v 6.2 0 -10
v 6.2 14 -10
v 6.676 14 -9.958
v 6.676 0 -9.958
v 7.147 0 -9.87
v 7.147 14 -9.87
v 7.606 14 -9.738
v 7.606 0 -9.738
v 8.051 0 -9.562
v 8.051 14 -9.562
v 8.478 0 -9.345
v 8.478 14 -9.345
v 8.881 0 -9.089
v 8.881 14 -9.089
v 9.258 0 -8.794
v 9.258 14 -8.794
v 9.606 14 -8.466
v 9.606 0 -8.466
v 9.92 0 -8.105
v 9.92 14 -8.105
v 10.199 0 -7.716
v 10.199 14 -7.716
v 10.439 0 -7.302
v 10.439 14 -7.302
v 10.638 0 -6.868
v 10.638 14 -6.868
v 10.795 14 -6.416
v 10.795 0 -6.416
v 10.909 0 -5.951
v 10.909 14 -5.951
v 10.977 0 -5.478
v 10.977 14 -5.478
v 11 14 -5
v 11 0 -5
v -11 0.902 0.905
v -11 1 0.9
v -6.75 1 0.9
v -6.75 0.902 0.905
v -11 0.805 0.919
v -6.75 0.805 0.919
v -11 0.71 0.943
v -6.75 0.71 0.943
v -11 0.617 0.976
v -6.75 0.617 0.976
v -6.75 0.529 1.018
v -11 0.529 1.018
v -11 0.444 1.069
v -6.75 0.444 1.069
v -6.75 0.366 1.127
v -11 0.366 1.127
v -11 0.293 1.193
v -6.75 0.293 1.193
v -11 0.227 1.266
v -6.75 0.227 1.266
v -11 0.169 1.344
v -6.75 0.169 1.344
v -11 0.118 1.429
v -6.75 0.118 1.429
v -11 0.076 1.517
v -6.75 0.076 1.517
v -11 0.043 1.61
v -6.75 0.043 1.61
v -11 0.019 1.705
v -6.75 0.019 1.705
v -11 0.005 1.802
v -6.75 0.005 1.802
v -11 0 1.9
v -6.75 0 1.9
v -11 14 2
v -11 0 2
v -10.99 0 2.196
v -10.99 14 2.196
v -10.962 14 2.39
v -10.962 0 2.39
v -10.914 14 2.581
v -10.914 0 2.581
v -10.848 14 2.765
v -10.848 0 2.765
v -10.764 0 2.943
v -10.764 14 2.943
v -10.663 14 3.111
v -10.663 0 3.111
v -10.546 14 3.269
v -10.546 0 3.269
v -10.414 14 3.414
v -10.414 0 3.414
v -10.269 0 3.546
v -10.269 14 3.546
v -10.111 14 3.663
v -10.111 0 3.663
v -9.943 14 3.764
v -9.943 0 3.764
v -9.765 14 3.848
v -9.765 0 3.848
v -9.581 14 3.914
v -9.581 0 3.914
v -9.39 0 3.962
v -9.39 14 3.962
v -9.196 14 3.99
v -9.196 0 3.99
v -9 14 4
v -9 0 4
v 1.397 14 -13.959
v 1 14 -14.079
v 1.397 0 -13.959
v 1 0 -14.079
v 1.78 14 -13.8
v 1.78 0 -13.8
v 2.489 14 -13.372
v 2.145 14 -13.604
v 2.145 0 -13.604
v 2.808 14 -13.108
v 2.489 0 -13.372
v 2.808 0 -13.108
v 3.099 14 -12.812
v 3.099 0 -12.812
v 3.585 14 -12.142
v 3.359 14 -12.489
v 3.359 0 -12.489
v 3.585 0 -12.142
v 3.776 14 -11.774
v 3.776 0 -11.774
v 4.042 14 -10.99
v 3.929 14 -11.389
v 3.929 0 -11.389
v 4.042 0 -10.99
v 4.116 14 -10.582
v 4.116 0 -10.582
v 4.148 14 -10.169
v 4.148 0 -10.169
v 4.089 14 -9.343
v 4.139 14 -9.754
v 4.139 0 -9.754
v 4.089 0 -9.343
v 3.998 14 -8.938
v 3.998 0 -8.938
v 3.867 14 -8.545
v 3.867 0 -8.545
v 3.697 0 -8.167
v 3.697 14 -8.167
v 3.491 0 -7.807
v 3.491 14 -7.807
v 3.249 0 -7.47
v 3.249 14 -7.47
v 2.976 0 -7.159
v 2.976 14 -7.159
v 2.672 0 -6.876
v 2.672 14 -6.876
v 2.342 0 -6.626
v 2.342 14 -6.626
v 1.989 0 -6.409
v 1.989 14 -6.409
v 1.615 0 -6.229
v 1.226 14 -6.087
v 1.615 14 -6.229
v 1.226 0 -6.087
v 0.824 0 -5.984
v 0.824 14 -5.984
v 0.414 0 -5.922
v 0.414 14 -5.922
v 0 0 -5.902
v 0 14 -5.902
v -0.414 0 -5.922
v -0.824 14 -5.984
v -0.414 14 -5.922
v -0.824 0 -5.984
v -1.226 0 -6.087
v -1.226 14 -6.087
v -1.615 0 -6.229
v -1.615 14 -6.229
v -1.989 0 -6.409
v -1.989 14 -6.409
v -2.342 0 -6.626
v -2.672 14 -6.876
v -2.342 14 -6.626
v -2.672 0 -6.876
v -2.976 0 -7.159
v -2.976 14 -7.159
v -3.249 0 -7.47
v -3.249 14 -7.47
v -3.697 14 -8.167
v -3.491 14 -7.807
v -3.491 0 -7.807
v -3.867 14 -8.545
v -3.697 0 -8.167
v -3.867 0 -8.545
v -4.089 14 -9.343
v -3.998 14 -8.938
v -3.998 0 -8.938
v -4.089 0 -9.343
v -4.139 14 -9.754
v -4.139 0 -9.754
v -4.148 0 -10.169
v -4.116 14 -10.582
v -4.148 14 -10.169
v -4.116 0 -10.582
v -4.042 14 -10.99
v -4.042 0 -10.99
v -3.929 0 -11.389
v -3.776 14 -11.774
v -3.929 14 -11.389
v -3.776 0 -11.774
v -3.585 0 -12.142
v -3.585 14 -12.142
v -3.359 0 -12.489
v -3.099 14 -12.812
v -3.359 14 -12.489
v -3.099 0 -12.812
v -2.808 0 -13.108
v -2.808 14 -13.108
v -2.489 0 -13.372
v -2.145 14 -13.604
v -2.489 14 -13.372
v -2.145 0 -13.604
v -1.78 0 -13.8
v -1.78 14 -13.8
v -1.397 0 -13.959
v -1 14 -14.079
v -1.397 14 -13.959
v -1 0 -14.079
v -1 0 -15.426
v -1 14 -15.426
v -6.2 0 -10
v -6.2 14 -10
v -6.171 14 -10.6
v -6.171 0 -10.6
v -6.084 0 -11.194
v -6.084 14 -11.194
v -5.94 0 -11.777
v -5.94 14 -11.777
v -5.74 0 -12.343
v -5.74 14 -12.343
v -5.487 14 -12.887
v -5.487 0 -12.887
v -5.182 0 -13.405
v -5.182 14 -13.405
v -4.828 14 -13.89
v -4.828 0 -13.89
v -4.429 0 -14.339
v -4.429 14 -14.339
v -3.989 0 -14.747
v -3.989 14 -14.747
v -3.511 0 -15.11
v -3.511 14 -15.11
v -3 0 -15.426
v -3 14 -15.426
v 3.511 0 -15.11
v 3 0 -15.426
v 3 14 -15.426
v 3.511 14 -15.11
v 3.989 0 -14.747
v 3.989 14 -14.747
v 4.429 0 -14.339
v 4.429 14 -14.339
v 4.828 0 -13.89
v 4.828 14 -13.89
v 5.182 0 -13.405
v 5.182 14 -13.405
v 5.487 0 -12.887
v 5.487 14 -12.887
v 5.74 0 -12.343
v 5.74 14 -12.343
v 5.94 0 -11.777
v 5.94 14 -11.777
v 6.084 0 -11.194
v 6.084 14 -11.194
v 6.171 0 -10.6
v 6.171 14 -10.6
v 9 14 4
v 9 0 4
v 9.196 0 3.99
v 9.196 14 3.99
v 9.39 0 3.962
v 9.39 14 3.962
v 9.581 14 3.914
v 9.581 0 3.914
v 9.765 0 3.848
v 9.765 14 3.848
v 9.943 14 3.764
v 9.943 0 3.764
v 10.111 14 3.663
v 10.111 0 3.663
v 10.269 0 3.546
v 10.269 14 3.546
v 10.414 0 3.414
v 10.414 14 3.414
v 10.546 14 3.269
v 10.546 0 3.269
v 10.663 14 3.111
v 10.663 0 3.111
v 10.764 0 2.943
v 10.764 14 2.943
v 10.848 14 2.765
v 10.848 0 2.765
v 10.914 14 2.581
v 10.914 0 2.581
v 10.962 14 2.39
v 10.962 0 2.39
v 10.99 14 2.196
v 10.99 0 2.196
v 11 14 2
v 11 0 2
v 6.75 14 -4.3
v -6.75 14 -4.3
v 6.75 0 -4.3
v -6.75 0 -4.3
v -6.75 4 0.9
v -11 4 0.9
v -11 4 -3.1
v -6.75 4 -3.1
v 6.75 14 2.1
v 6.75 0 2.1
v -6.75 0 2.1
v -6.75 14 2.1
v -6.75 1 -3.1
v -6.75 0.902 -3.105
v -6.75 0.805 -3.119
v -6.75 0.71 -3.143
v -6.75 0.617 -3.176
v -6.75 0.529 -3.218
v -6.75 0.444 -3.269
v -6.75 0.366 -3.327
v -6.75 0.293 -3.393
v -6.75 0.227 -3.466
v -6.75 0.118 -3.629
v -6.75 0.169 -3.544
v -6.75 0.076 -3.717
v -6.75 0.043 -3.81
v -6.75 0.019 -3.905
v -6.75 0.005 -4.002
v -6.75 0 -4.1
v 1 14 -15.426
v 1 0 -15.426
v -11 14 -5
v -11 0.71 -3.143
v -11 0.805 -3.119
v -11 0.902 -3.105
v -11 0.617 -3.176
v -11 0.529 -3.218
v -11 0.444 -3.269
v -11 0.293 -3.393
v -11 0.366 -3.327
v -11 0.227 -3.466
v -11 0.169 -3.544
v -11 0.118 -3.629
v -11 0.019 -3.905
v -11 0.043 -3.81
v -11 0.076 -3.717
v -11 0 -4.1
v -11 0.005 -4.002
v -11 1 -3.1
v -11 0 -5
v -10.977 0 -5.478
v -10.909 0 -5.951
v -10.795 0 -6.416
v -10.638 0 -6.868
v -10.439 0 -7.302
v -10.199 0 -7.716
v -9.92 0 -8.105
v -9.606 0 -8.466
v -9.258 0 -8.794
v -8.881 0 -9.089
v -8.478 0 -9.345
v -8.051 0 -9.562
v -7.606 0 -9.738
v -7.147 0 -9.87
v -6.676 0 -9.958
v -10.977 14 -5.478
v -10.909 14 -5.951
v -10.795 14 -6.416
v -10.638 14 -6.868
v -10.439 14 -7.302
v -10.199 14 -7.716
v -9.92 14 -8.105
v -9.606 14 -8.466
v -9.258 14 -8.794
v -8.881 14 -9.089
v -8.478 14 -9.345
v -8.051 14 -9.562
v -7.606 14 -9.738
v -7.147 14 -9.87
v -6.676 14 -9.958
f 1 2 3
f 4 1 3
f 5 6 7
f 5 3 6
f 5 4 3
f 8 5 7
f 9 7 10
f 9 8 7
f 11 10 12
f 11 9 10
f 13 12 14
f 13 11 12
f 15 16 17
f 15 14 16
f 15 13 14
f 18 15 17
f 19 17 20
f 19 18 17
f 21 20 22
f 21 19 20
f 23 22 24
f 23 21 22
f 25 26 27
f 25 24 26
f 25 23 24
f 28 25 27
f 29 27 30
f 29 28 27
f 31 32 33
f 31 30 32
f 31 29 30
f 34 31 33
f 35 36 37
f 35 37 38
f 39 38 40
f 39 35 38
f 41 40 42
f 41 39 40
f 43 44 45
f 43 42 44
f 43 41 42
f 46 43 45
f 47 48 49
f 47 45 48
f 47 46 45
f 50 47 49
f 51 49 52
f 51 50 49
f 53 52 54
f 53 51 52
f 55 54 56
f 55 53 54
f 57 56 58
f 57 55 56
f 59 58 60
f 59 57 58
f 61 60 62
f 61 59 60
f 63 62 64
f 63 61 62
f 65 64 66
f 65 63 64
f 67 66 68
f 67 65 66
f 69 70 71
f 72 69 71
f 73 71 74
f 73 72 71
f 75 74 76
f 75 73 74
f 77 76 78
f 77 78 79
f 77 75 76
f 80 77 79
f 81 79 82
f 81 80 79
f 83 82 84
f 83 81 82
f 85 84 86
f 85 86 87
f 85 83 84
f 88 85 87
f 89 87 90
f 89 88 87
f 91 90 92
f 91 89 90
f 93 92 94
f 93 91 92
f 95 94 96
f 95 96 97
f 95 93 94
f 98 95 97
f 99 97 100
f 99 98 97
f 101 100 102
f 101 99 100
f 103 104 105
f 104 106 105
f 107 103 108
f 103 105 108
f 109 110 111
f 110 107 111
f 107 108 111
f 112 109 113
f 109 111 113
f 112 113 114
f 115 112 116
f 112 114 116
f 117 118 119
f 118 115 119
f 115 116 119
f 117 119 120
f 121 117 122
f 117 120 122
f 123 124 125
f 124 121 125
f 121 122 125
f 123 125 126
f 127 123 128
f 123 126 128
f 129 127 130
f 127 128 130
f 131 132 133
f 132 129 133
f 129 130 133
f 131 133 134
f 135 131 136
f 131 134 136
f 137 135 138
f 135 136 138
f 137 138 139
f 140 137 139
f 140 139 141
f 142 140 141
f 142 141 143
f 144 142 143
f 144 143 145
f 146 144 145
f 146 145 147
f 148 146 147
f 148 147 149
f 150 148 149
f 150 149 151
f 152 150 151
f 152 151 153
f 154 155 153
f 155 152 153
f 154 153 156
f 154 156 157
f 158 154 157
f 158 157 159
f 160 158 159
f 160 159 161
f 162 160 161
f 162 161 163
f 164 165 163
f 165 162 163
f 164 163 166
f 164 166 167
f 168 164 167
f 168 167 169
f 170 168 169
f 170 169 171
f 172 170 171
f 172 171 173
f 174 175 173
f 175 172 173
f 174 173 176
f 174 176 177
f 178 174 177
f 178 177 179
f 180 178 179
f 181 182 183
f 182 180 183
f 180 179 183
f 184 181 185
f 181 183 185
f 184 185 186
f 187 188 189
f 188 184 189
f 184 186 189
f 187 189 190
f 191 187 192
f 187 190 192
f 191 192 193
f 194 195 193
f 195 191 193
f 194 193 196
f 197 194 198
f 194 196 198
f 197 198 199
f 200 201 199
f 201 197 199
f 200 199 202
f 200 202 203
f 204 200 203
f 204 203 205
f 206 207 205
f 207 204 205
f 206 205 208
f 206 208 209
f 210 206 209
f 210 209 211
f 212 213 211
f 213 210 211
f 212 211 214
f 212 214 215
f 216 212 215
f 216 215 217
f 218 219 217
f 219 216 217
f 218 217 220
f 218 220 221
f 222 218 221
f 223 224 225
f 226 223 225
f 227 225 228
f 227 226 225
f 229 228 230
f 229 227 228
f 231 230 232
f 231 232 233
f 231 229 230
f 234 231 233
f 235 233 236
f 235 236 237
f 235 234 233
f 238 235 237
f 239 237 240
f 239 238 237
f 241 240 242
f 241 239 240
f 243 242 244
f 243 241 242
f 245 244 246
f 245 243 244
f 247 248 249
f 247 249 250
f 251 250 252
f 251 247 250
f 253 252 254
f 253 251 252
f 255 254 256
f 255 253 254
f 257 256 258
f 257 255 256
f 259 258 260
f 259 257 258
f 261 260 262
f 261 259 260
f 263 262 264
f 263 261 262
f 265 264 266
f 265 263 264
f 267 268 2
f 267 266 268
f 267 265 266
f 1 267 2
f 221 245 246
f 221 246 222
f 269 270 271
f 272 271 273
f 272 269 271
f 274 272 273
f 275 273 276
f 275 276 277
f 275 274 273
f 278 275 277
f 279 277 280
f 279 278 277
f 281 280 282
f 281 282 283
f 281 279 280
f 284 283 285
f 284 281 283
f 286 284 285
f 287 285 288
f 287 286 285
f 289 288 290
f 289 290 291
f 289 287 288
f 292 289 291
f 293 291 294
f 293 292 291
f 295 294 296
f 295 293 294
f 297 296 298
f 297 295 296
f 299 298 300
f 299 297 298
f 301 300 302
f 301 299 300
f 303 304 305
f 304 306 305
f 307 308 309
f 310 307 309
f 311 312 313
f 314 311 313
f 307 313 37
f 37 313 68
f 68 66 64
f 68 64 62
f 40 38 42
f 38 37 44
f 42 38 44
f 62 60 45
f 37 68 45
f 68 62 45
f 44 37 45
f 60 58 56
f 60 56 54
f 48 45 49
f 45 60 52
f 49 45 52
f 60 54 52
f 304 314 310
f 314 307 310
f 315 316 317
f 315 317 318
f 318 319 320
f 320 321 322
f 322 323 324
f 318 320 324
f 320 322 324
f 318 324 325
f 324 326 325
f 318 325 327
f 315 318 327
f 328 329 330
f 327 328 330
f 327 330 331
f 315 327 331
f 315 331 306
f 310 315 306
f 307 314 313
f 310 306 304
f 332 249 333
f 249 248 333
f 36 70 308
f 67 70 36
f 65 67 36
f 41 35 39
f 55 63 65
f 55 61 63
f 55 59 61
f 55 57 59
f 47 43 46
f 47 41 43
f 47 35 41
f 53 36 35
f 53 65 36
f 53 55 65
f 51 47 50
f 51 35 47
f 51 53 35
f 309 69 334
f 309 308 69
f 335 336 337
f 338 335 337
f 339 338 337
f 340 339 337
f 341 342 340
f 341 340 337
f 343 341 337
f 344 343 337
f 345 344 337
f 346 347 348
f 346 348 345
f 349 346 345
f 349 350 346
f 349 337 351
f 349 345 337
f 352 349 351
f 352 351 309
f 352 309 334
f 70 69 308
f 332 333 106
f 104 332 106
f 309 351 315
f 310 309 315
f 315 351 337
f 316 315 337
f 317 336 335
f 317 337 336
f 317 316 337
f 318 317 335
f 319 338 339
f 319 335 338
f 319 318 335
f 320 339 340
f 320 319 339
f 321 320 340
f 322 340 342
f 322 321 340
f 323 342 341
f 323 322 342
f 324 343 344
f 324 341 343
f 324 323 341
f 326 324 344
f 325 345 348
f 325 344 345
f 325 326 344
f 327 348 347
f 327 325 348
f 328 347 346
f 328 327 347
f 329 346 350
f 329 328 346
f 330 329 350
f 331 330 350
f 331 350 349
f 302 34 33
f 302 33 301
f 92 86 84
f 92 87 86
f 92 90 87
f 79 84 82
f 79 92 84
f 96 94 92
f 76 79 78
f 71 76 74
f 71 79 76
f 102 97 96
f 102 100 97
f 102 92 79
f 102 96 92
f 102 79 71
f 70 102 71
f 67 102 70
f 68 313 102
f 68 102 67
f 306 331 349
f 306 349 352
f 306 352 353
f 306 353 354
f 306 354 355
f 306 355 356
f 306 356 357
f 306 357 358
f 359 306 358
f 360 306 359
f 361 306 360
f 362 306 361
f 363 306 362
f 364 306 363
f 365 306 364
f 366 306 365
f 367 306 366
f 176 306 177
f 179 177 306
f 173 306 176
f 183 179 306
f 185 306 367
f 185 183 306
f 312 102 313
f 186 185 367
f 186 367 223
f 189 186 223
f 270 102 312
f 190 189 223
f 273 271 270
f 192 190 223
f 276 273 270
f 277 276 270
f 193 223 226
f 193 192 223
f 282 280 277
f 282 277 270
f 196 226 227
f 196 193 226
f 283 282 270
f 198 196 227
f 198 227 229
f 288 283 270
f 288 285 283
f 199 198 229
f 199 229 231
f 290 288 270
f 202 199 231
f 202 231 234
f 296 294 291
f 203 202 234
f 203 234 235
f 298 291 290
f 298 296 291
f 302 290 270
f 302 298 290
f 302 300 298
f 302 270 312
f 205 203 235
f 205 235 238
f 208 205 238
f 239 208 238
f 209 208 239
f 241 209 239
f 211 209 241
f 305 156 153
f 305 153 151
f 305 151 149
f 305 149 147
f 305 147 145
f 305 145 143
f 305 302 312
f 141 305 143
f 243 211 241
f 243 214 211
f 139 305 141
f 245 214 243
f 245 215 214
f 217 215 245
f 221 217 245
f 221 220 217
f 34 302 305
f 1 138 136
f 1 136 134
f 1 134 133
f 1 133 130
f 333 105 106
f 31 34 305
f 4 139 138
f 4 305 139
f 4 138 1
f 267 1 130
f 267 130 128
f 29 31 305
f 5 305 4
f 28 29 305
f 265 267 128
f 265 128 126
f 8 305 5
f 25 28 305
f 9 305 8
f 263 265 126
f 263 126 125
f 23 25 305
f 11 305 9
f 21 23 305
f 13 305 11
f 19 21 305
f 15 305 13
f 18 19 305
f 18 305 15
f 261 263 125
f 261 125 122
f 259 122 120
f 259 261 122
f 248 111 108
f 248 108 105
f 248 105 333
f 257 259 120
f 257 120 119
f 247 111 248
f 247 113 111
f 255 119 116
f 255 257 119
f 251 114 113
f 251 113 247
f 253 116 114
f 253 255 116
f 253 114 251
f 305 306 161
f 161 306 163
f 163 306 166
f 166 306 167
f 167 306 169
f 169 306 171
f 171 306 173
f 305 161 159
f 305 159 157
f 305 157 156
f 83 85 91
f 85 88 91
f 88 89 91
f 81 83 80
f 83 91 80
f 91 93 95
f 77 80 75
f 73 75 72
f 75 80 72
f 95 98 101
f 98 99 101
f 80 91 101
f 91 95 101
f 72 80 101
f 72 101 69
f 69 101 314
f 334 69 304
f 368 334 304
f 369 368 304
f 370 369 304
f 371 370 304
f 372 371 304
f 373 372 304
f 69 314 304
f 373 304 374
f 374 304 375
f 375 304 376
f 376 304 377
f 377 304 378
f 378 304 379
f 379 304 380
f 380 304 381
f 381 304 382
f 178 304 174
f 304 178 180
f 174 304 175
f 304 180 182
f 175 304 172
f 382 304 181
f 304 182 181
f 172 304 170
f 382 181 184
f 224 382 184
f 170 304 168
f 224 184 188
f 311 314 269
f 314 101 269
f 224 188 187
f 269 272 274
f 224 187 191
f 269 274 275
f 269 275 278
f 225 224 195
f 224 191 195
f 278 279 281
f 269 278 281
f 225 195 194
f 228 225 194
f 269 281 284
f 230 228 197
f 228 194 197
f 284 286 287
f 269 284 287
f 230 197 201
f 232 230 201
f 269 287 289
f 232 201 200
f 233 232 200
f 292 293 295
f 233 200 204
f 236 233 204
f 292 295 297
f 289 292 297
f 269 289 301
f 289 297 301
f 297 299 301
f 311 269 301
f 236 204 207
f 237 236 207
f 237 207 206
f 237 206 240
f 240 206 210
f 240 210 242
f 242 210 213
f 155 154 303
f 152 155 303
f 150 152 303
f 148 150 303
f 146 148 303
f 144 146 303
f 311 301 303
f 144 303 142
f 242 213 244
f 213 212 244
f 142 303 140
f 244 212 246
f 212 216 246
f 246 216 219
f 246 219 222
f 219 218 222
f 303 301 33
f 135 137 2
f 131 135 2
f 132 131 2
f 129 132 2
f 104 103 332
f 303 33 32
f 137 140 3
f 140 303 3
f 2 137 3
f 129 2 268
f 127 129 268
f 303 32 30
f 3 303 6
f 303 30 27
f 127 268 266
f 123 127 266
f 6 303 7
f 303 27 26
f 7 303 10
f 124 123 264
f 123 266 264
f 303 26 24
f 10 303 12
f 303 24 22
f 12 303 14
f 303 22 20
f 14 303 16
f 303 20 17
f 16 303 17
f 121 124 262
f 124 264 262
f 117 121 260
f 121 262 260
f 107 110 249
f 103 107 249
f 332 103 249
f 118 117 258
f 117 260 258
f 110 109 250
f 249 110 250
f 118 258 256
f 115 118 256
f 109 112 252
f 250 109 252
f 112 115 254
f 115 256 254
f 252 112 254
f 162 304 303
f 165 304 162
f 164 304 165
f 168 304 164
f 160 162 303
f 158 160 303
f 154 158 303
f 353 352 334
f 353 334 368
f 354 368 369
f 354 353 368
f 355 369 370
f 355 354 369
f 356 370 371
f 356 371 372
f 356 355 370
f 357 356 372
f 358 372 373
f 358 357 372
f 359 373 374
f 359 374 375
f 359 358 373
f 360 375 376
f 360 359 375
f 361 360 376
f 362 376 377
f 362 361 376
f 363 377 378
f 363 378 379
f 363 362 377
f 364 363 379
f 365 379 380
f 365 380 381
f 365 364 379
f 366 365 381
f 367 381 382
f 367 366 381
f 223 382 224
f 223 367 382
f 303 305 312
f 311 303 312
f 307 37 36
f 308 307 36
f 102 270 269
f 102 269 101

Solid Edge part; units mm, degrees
sketch "Sketch1" plane through (0, 0, 0) normal (0, -1, 0) x (1, 0, 0)
  line L0 (-6.75, -4.3) -> (6.75, -4.3)
  line L1 (6.75, -4.3) -> (6.75, 2.1)
  line L2 (6.75, 2.1) -> (-6.75, 2.1)
  line L3 (-6.75, 2.1) -> (-6.75, -4.3)
  line L4 (11, -5) -> (11, 4)
  line L5 (11, 4) -> (-11, 4)
  line L6 (-11, 4) -> (-11, -5)
  arc A0 (-11, -5) -> (-6.2, -10) centre (-5.9958, -5) ccw
  line L7 (-3, -15.4259) -> (-1, -15.4259)
  line L8 (-1, -14.0792) -> (-1, -15.4259)
  line L9 (1, -15.4259) -> (1, -14.0792)
  line L10 (3, -15.4259) -> (1, -15.4259)
  arc A1 (6.2, -10) -> (3, -15.4259) centre (0, -10) cw
  arc A2 (11, -5) -> (6.2, -10) centre (5.9958, -5) cw
  arc A3 (-6.2, -10) -> (-3, -15.4259) centre (0, -10) ccw
  arc A4 (-1, -14.0792) -> (1, -14.0792) centre (0, -10.0515) cw
extrude "Protrusion1" add sketch "Sketch1" against normal blind 14
sketch "Sketch2" plane through (0, 0, -5.7129) normal (0, -1, 0) x (1, 0, 0)
  line L0 (-11.9165, 2.6129) -> (-5.9165, 2.6129)
  line L1 (-5.9165, 2.6129) -> (-5.9165, 6.6129)
  line L2 (-5.9165, 6.6129) -> (-11.9165, 6.6129)
  line L3 (-11.9165, 6.6129) -> (-11.9165, 2.6129)
extrude "ExtrudedCutout_2" cut sketch "Sketch2" against normal blind 4
fillet "Round_2" radius 1 2 edges at (-8.875, 0, 0.9) (-8.875, 0, -3.1)
fillet "Round_3" radius 2 2 edges at (-11, 7, 4) (11, 7, 4)
